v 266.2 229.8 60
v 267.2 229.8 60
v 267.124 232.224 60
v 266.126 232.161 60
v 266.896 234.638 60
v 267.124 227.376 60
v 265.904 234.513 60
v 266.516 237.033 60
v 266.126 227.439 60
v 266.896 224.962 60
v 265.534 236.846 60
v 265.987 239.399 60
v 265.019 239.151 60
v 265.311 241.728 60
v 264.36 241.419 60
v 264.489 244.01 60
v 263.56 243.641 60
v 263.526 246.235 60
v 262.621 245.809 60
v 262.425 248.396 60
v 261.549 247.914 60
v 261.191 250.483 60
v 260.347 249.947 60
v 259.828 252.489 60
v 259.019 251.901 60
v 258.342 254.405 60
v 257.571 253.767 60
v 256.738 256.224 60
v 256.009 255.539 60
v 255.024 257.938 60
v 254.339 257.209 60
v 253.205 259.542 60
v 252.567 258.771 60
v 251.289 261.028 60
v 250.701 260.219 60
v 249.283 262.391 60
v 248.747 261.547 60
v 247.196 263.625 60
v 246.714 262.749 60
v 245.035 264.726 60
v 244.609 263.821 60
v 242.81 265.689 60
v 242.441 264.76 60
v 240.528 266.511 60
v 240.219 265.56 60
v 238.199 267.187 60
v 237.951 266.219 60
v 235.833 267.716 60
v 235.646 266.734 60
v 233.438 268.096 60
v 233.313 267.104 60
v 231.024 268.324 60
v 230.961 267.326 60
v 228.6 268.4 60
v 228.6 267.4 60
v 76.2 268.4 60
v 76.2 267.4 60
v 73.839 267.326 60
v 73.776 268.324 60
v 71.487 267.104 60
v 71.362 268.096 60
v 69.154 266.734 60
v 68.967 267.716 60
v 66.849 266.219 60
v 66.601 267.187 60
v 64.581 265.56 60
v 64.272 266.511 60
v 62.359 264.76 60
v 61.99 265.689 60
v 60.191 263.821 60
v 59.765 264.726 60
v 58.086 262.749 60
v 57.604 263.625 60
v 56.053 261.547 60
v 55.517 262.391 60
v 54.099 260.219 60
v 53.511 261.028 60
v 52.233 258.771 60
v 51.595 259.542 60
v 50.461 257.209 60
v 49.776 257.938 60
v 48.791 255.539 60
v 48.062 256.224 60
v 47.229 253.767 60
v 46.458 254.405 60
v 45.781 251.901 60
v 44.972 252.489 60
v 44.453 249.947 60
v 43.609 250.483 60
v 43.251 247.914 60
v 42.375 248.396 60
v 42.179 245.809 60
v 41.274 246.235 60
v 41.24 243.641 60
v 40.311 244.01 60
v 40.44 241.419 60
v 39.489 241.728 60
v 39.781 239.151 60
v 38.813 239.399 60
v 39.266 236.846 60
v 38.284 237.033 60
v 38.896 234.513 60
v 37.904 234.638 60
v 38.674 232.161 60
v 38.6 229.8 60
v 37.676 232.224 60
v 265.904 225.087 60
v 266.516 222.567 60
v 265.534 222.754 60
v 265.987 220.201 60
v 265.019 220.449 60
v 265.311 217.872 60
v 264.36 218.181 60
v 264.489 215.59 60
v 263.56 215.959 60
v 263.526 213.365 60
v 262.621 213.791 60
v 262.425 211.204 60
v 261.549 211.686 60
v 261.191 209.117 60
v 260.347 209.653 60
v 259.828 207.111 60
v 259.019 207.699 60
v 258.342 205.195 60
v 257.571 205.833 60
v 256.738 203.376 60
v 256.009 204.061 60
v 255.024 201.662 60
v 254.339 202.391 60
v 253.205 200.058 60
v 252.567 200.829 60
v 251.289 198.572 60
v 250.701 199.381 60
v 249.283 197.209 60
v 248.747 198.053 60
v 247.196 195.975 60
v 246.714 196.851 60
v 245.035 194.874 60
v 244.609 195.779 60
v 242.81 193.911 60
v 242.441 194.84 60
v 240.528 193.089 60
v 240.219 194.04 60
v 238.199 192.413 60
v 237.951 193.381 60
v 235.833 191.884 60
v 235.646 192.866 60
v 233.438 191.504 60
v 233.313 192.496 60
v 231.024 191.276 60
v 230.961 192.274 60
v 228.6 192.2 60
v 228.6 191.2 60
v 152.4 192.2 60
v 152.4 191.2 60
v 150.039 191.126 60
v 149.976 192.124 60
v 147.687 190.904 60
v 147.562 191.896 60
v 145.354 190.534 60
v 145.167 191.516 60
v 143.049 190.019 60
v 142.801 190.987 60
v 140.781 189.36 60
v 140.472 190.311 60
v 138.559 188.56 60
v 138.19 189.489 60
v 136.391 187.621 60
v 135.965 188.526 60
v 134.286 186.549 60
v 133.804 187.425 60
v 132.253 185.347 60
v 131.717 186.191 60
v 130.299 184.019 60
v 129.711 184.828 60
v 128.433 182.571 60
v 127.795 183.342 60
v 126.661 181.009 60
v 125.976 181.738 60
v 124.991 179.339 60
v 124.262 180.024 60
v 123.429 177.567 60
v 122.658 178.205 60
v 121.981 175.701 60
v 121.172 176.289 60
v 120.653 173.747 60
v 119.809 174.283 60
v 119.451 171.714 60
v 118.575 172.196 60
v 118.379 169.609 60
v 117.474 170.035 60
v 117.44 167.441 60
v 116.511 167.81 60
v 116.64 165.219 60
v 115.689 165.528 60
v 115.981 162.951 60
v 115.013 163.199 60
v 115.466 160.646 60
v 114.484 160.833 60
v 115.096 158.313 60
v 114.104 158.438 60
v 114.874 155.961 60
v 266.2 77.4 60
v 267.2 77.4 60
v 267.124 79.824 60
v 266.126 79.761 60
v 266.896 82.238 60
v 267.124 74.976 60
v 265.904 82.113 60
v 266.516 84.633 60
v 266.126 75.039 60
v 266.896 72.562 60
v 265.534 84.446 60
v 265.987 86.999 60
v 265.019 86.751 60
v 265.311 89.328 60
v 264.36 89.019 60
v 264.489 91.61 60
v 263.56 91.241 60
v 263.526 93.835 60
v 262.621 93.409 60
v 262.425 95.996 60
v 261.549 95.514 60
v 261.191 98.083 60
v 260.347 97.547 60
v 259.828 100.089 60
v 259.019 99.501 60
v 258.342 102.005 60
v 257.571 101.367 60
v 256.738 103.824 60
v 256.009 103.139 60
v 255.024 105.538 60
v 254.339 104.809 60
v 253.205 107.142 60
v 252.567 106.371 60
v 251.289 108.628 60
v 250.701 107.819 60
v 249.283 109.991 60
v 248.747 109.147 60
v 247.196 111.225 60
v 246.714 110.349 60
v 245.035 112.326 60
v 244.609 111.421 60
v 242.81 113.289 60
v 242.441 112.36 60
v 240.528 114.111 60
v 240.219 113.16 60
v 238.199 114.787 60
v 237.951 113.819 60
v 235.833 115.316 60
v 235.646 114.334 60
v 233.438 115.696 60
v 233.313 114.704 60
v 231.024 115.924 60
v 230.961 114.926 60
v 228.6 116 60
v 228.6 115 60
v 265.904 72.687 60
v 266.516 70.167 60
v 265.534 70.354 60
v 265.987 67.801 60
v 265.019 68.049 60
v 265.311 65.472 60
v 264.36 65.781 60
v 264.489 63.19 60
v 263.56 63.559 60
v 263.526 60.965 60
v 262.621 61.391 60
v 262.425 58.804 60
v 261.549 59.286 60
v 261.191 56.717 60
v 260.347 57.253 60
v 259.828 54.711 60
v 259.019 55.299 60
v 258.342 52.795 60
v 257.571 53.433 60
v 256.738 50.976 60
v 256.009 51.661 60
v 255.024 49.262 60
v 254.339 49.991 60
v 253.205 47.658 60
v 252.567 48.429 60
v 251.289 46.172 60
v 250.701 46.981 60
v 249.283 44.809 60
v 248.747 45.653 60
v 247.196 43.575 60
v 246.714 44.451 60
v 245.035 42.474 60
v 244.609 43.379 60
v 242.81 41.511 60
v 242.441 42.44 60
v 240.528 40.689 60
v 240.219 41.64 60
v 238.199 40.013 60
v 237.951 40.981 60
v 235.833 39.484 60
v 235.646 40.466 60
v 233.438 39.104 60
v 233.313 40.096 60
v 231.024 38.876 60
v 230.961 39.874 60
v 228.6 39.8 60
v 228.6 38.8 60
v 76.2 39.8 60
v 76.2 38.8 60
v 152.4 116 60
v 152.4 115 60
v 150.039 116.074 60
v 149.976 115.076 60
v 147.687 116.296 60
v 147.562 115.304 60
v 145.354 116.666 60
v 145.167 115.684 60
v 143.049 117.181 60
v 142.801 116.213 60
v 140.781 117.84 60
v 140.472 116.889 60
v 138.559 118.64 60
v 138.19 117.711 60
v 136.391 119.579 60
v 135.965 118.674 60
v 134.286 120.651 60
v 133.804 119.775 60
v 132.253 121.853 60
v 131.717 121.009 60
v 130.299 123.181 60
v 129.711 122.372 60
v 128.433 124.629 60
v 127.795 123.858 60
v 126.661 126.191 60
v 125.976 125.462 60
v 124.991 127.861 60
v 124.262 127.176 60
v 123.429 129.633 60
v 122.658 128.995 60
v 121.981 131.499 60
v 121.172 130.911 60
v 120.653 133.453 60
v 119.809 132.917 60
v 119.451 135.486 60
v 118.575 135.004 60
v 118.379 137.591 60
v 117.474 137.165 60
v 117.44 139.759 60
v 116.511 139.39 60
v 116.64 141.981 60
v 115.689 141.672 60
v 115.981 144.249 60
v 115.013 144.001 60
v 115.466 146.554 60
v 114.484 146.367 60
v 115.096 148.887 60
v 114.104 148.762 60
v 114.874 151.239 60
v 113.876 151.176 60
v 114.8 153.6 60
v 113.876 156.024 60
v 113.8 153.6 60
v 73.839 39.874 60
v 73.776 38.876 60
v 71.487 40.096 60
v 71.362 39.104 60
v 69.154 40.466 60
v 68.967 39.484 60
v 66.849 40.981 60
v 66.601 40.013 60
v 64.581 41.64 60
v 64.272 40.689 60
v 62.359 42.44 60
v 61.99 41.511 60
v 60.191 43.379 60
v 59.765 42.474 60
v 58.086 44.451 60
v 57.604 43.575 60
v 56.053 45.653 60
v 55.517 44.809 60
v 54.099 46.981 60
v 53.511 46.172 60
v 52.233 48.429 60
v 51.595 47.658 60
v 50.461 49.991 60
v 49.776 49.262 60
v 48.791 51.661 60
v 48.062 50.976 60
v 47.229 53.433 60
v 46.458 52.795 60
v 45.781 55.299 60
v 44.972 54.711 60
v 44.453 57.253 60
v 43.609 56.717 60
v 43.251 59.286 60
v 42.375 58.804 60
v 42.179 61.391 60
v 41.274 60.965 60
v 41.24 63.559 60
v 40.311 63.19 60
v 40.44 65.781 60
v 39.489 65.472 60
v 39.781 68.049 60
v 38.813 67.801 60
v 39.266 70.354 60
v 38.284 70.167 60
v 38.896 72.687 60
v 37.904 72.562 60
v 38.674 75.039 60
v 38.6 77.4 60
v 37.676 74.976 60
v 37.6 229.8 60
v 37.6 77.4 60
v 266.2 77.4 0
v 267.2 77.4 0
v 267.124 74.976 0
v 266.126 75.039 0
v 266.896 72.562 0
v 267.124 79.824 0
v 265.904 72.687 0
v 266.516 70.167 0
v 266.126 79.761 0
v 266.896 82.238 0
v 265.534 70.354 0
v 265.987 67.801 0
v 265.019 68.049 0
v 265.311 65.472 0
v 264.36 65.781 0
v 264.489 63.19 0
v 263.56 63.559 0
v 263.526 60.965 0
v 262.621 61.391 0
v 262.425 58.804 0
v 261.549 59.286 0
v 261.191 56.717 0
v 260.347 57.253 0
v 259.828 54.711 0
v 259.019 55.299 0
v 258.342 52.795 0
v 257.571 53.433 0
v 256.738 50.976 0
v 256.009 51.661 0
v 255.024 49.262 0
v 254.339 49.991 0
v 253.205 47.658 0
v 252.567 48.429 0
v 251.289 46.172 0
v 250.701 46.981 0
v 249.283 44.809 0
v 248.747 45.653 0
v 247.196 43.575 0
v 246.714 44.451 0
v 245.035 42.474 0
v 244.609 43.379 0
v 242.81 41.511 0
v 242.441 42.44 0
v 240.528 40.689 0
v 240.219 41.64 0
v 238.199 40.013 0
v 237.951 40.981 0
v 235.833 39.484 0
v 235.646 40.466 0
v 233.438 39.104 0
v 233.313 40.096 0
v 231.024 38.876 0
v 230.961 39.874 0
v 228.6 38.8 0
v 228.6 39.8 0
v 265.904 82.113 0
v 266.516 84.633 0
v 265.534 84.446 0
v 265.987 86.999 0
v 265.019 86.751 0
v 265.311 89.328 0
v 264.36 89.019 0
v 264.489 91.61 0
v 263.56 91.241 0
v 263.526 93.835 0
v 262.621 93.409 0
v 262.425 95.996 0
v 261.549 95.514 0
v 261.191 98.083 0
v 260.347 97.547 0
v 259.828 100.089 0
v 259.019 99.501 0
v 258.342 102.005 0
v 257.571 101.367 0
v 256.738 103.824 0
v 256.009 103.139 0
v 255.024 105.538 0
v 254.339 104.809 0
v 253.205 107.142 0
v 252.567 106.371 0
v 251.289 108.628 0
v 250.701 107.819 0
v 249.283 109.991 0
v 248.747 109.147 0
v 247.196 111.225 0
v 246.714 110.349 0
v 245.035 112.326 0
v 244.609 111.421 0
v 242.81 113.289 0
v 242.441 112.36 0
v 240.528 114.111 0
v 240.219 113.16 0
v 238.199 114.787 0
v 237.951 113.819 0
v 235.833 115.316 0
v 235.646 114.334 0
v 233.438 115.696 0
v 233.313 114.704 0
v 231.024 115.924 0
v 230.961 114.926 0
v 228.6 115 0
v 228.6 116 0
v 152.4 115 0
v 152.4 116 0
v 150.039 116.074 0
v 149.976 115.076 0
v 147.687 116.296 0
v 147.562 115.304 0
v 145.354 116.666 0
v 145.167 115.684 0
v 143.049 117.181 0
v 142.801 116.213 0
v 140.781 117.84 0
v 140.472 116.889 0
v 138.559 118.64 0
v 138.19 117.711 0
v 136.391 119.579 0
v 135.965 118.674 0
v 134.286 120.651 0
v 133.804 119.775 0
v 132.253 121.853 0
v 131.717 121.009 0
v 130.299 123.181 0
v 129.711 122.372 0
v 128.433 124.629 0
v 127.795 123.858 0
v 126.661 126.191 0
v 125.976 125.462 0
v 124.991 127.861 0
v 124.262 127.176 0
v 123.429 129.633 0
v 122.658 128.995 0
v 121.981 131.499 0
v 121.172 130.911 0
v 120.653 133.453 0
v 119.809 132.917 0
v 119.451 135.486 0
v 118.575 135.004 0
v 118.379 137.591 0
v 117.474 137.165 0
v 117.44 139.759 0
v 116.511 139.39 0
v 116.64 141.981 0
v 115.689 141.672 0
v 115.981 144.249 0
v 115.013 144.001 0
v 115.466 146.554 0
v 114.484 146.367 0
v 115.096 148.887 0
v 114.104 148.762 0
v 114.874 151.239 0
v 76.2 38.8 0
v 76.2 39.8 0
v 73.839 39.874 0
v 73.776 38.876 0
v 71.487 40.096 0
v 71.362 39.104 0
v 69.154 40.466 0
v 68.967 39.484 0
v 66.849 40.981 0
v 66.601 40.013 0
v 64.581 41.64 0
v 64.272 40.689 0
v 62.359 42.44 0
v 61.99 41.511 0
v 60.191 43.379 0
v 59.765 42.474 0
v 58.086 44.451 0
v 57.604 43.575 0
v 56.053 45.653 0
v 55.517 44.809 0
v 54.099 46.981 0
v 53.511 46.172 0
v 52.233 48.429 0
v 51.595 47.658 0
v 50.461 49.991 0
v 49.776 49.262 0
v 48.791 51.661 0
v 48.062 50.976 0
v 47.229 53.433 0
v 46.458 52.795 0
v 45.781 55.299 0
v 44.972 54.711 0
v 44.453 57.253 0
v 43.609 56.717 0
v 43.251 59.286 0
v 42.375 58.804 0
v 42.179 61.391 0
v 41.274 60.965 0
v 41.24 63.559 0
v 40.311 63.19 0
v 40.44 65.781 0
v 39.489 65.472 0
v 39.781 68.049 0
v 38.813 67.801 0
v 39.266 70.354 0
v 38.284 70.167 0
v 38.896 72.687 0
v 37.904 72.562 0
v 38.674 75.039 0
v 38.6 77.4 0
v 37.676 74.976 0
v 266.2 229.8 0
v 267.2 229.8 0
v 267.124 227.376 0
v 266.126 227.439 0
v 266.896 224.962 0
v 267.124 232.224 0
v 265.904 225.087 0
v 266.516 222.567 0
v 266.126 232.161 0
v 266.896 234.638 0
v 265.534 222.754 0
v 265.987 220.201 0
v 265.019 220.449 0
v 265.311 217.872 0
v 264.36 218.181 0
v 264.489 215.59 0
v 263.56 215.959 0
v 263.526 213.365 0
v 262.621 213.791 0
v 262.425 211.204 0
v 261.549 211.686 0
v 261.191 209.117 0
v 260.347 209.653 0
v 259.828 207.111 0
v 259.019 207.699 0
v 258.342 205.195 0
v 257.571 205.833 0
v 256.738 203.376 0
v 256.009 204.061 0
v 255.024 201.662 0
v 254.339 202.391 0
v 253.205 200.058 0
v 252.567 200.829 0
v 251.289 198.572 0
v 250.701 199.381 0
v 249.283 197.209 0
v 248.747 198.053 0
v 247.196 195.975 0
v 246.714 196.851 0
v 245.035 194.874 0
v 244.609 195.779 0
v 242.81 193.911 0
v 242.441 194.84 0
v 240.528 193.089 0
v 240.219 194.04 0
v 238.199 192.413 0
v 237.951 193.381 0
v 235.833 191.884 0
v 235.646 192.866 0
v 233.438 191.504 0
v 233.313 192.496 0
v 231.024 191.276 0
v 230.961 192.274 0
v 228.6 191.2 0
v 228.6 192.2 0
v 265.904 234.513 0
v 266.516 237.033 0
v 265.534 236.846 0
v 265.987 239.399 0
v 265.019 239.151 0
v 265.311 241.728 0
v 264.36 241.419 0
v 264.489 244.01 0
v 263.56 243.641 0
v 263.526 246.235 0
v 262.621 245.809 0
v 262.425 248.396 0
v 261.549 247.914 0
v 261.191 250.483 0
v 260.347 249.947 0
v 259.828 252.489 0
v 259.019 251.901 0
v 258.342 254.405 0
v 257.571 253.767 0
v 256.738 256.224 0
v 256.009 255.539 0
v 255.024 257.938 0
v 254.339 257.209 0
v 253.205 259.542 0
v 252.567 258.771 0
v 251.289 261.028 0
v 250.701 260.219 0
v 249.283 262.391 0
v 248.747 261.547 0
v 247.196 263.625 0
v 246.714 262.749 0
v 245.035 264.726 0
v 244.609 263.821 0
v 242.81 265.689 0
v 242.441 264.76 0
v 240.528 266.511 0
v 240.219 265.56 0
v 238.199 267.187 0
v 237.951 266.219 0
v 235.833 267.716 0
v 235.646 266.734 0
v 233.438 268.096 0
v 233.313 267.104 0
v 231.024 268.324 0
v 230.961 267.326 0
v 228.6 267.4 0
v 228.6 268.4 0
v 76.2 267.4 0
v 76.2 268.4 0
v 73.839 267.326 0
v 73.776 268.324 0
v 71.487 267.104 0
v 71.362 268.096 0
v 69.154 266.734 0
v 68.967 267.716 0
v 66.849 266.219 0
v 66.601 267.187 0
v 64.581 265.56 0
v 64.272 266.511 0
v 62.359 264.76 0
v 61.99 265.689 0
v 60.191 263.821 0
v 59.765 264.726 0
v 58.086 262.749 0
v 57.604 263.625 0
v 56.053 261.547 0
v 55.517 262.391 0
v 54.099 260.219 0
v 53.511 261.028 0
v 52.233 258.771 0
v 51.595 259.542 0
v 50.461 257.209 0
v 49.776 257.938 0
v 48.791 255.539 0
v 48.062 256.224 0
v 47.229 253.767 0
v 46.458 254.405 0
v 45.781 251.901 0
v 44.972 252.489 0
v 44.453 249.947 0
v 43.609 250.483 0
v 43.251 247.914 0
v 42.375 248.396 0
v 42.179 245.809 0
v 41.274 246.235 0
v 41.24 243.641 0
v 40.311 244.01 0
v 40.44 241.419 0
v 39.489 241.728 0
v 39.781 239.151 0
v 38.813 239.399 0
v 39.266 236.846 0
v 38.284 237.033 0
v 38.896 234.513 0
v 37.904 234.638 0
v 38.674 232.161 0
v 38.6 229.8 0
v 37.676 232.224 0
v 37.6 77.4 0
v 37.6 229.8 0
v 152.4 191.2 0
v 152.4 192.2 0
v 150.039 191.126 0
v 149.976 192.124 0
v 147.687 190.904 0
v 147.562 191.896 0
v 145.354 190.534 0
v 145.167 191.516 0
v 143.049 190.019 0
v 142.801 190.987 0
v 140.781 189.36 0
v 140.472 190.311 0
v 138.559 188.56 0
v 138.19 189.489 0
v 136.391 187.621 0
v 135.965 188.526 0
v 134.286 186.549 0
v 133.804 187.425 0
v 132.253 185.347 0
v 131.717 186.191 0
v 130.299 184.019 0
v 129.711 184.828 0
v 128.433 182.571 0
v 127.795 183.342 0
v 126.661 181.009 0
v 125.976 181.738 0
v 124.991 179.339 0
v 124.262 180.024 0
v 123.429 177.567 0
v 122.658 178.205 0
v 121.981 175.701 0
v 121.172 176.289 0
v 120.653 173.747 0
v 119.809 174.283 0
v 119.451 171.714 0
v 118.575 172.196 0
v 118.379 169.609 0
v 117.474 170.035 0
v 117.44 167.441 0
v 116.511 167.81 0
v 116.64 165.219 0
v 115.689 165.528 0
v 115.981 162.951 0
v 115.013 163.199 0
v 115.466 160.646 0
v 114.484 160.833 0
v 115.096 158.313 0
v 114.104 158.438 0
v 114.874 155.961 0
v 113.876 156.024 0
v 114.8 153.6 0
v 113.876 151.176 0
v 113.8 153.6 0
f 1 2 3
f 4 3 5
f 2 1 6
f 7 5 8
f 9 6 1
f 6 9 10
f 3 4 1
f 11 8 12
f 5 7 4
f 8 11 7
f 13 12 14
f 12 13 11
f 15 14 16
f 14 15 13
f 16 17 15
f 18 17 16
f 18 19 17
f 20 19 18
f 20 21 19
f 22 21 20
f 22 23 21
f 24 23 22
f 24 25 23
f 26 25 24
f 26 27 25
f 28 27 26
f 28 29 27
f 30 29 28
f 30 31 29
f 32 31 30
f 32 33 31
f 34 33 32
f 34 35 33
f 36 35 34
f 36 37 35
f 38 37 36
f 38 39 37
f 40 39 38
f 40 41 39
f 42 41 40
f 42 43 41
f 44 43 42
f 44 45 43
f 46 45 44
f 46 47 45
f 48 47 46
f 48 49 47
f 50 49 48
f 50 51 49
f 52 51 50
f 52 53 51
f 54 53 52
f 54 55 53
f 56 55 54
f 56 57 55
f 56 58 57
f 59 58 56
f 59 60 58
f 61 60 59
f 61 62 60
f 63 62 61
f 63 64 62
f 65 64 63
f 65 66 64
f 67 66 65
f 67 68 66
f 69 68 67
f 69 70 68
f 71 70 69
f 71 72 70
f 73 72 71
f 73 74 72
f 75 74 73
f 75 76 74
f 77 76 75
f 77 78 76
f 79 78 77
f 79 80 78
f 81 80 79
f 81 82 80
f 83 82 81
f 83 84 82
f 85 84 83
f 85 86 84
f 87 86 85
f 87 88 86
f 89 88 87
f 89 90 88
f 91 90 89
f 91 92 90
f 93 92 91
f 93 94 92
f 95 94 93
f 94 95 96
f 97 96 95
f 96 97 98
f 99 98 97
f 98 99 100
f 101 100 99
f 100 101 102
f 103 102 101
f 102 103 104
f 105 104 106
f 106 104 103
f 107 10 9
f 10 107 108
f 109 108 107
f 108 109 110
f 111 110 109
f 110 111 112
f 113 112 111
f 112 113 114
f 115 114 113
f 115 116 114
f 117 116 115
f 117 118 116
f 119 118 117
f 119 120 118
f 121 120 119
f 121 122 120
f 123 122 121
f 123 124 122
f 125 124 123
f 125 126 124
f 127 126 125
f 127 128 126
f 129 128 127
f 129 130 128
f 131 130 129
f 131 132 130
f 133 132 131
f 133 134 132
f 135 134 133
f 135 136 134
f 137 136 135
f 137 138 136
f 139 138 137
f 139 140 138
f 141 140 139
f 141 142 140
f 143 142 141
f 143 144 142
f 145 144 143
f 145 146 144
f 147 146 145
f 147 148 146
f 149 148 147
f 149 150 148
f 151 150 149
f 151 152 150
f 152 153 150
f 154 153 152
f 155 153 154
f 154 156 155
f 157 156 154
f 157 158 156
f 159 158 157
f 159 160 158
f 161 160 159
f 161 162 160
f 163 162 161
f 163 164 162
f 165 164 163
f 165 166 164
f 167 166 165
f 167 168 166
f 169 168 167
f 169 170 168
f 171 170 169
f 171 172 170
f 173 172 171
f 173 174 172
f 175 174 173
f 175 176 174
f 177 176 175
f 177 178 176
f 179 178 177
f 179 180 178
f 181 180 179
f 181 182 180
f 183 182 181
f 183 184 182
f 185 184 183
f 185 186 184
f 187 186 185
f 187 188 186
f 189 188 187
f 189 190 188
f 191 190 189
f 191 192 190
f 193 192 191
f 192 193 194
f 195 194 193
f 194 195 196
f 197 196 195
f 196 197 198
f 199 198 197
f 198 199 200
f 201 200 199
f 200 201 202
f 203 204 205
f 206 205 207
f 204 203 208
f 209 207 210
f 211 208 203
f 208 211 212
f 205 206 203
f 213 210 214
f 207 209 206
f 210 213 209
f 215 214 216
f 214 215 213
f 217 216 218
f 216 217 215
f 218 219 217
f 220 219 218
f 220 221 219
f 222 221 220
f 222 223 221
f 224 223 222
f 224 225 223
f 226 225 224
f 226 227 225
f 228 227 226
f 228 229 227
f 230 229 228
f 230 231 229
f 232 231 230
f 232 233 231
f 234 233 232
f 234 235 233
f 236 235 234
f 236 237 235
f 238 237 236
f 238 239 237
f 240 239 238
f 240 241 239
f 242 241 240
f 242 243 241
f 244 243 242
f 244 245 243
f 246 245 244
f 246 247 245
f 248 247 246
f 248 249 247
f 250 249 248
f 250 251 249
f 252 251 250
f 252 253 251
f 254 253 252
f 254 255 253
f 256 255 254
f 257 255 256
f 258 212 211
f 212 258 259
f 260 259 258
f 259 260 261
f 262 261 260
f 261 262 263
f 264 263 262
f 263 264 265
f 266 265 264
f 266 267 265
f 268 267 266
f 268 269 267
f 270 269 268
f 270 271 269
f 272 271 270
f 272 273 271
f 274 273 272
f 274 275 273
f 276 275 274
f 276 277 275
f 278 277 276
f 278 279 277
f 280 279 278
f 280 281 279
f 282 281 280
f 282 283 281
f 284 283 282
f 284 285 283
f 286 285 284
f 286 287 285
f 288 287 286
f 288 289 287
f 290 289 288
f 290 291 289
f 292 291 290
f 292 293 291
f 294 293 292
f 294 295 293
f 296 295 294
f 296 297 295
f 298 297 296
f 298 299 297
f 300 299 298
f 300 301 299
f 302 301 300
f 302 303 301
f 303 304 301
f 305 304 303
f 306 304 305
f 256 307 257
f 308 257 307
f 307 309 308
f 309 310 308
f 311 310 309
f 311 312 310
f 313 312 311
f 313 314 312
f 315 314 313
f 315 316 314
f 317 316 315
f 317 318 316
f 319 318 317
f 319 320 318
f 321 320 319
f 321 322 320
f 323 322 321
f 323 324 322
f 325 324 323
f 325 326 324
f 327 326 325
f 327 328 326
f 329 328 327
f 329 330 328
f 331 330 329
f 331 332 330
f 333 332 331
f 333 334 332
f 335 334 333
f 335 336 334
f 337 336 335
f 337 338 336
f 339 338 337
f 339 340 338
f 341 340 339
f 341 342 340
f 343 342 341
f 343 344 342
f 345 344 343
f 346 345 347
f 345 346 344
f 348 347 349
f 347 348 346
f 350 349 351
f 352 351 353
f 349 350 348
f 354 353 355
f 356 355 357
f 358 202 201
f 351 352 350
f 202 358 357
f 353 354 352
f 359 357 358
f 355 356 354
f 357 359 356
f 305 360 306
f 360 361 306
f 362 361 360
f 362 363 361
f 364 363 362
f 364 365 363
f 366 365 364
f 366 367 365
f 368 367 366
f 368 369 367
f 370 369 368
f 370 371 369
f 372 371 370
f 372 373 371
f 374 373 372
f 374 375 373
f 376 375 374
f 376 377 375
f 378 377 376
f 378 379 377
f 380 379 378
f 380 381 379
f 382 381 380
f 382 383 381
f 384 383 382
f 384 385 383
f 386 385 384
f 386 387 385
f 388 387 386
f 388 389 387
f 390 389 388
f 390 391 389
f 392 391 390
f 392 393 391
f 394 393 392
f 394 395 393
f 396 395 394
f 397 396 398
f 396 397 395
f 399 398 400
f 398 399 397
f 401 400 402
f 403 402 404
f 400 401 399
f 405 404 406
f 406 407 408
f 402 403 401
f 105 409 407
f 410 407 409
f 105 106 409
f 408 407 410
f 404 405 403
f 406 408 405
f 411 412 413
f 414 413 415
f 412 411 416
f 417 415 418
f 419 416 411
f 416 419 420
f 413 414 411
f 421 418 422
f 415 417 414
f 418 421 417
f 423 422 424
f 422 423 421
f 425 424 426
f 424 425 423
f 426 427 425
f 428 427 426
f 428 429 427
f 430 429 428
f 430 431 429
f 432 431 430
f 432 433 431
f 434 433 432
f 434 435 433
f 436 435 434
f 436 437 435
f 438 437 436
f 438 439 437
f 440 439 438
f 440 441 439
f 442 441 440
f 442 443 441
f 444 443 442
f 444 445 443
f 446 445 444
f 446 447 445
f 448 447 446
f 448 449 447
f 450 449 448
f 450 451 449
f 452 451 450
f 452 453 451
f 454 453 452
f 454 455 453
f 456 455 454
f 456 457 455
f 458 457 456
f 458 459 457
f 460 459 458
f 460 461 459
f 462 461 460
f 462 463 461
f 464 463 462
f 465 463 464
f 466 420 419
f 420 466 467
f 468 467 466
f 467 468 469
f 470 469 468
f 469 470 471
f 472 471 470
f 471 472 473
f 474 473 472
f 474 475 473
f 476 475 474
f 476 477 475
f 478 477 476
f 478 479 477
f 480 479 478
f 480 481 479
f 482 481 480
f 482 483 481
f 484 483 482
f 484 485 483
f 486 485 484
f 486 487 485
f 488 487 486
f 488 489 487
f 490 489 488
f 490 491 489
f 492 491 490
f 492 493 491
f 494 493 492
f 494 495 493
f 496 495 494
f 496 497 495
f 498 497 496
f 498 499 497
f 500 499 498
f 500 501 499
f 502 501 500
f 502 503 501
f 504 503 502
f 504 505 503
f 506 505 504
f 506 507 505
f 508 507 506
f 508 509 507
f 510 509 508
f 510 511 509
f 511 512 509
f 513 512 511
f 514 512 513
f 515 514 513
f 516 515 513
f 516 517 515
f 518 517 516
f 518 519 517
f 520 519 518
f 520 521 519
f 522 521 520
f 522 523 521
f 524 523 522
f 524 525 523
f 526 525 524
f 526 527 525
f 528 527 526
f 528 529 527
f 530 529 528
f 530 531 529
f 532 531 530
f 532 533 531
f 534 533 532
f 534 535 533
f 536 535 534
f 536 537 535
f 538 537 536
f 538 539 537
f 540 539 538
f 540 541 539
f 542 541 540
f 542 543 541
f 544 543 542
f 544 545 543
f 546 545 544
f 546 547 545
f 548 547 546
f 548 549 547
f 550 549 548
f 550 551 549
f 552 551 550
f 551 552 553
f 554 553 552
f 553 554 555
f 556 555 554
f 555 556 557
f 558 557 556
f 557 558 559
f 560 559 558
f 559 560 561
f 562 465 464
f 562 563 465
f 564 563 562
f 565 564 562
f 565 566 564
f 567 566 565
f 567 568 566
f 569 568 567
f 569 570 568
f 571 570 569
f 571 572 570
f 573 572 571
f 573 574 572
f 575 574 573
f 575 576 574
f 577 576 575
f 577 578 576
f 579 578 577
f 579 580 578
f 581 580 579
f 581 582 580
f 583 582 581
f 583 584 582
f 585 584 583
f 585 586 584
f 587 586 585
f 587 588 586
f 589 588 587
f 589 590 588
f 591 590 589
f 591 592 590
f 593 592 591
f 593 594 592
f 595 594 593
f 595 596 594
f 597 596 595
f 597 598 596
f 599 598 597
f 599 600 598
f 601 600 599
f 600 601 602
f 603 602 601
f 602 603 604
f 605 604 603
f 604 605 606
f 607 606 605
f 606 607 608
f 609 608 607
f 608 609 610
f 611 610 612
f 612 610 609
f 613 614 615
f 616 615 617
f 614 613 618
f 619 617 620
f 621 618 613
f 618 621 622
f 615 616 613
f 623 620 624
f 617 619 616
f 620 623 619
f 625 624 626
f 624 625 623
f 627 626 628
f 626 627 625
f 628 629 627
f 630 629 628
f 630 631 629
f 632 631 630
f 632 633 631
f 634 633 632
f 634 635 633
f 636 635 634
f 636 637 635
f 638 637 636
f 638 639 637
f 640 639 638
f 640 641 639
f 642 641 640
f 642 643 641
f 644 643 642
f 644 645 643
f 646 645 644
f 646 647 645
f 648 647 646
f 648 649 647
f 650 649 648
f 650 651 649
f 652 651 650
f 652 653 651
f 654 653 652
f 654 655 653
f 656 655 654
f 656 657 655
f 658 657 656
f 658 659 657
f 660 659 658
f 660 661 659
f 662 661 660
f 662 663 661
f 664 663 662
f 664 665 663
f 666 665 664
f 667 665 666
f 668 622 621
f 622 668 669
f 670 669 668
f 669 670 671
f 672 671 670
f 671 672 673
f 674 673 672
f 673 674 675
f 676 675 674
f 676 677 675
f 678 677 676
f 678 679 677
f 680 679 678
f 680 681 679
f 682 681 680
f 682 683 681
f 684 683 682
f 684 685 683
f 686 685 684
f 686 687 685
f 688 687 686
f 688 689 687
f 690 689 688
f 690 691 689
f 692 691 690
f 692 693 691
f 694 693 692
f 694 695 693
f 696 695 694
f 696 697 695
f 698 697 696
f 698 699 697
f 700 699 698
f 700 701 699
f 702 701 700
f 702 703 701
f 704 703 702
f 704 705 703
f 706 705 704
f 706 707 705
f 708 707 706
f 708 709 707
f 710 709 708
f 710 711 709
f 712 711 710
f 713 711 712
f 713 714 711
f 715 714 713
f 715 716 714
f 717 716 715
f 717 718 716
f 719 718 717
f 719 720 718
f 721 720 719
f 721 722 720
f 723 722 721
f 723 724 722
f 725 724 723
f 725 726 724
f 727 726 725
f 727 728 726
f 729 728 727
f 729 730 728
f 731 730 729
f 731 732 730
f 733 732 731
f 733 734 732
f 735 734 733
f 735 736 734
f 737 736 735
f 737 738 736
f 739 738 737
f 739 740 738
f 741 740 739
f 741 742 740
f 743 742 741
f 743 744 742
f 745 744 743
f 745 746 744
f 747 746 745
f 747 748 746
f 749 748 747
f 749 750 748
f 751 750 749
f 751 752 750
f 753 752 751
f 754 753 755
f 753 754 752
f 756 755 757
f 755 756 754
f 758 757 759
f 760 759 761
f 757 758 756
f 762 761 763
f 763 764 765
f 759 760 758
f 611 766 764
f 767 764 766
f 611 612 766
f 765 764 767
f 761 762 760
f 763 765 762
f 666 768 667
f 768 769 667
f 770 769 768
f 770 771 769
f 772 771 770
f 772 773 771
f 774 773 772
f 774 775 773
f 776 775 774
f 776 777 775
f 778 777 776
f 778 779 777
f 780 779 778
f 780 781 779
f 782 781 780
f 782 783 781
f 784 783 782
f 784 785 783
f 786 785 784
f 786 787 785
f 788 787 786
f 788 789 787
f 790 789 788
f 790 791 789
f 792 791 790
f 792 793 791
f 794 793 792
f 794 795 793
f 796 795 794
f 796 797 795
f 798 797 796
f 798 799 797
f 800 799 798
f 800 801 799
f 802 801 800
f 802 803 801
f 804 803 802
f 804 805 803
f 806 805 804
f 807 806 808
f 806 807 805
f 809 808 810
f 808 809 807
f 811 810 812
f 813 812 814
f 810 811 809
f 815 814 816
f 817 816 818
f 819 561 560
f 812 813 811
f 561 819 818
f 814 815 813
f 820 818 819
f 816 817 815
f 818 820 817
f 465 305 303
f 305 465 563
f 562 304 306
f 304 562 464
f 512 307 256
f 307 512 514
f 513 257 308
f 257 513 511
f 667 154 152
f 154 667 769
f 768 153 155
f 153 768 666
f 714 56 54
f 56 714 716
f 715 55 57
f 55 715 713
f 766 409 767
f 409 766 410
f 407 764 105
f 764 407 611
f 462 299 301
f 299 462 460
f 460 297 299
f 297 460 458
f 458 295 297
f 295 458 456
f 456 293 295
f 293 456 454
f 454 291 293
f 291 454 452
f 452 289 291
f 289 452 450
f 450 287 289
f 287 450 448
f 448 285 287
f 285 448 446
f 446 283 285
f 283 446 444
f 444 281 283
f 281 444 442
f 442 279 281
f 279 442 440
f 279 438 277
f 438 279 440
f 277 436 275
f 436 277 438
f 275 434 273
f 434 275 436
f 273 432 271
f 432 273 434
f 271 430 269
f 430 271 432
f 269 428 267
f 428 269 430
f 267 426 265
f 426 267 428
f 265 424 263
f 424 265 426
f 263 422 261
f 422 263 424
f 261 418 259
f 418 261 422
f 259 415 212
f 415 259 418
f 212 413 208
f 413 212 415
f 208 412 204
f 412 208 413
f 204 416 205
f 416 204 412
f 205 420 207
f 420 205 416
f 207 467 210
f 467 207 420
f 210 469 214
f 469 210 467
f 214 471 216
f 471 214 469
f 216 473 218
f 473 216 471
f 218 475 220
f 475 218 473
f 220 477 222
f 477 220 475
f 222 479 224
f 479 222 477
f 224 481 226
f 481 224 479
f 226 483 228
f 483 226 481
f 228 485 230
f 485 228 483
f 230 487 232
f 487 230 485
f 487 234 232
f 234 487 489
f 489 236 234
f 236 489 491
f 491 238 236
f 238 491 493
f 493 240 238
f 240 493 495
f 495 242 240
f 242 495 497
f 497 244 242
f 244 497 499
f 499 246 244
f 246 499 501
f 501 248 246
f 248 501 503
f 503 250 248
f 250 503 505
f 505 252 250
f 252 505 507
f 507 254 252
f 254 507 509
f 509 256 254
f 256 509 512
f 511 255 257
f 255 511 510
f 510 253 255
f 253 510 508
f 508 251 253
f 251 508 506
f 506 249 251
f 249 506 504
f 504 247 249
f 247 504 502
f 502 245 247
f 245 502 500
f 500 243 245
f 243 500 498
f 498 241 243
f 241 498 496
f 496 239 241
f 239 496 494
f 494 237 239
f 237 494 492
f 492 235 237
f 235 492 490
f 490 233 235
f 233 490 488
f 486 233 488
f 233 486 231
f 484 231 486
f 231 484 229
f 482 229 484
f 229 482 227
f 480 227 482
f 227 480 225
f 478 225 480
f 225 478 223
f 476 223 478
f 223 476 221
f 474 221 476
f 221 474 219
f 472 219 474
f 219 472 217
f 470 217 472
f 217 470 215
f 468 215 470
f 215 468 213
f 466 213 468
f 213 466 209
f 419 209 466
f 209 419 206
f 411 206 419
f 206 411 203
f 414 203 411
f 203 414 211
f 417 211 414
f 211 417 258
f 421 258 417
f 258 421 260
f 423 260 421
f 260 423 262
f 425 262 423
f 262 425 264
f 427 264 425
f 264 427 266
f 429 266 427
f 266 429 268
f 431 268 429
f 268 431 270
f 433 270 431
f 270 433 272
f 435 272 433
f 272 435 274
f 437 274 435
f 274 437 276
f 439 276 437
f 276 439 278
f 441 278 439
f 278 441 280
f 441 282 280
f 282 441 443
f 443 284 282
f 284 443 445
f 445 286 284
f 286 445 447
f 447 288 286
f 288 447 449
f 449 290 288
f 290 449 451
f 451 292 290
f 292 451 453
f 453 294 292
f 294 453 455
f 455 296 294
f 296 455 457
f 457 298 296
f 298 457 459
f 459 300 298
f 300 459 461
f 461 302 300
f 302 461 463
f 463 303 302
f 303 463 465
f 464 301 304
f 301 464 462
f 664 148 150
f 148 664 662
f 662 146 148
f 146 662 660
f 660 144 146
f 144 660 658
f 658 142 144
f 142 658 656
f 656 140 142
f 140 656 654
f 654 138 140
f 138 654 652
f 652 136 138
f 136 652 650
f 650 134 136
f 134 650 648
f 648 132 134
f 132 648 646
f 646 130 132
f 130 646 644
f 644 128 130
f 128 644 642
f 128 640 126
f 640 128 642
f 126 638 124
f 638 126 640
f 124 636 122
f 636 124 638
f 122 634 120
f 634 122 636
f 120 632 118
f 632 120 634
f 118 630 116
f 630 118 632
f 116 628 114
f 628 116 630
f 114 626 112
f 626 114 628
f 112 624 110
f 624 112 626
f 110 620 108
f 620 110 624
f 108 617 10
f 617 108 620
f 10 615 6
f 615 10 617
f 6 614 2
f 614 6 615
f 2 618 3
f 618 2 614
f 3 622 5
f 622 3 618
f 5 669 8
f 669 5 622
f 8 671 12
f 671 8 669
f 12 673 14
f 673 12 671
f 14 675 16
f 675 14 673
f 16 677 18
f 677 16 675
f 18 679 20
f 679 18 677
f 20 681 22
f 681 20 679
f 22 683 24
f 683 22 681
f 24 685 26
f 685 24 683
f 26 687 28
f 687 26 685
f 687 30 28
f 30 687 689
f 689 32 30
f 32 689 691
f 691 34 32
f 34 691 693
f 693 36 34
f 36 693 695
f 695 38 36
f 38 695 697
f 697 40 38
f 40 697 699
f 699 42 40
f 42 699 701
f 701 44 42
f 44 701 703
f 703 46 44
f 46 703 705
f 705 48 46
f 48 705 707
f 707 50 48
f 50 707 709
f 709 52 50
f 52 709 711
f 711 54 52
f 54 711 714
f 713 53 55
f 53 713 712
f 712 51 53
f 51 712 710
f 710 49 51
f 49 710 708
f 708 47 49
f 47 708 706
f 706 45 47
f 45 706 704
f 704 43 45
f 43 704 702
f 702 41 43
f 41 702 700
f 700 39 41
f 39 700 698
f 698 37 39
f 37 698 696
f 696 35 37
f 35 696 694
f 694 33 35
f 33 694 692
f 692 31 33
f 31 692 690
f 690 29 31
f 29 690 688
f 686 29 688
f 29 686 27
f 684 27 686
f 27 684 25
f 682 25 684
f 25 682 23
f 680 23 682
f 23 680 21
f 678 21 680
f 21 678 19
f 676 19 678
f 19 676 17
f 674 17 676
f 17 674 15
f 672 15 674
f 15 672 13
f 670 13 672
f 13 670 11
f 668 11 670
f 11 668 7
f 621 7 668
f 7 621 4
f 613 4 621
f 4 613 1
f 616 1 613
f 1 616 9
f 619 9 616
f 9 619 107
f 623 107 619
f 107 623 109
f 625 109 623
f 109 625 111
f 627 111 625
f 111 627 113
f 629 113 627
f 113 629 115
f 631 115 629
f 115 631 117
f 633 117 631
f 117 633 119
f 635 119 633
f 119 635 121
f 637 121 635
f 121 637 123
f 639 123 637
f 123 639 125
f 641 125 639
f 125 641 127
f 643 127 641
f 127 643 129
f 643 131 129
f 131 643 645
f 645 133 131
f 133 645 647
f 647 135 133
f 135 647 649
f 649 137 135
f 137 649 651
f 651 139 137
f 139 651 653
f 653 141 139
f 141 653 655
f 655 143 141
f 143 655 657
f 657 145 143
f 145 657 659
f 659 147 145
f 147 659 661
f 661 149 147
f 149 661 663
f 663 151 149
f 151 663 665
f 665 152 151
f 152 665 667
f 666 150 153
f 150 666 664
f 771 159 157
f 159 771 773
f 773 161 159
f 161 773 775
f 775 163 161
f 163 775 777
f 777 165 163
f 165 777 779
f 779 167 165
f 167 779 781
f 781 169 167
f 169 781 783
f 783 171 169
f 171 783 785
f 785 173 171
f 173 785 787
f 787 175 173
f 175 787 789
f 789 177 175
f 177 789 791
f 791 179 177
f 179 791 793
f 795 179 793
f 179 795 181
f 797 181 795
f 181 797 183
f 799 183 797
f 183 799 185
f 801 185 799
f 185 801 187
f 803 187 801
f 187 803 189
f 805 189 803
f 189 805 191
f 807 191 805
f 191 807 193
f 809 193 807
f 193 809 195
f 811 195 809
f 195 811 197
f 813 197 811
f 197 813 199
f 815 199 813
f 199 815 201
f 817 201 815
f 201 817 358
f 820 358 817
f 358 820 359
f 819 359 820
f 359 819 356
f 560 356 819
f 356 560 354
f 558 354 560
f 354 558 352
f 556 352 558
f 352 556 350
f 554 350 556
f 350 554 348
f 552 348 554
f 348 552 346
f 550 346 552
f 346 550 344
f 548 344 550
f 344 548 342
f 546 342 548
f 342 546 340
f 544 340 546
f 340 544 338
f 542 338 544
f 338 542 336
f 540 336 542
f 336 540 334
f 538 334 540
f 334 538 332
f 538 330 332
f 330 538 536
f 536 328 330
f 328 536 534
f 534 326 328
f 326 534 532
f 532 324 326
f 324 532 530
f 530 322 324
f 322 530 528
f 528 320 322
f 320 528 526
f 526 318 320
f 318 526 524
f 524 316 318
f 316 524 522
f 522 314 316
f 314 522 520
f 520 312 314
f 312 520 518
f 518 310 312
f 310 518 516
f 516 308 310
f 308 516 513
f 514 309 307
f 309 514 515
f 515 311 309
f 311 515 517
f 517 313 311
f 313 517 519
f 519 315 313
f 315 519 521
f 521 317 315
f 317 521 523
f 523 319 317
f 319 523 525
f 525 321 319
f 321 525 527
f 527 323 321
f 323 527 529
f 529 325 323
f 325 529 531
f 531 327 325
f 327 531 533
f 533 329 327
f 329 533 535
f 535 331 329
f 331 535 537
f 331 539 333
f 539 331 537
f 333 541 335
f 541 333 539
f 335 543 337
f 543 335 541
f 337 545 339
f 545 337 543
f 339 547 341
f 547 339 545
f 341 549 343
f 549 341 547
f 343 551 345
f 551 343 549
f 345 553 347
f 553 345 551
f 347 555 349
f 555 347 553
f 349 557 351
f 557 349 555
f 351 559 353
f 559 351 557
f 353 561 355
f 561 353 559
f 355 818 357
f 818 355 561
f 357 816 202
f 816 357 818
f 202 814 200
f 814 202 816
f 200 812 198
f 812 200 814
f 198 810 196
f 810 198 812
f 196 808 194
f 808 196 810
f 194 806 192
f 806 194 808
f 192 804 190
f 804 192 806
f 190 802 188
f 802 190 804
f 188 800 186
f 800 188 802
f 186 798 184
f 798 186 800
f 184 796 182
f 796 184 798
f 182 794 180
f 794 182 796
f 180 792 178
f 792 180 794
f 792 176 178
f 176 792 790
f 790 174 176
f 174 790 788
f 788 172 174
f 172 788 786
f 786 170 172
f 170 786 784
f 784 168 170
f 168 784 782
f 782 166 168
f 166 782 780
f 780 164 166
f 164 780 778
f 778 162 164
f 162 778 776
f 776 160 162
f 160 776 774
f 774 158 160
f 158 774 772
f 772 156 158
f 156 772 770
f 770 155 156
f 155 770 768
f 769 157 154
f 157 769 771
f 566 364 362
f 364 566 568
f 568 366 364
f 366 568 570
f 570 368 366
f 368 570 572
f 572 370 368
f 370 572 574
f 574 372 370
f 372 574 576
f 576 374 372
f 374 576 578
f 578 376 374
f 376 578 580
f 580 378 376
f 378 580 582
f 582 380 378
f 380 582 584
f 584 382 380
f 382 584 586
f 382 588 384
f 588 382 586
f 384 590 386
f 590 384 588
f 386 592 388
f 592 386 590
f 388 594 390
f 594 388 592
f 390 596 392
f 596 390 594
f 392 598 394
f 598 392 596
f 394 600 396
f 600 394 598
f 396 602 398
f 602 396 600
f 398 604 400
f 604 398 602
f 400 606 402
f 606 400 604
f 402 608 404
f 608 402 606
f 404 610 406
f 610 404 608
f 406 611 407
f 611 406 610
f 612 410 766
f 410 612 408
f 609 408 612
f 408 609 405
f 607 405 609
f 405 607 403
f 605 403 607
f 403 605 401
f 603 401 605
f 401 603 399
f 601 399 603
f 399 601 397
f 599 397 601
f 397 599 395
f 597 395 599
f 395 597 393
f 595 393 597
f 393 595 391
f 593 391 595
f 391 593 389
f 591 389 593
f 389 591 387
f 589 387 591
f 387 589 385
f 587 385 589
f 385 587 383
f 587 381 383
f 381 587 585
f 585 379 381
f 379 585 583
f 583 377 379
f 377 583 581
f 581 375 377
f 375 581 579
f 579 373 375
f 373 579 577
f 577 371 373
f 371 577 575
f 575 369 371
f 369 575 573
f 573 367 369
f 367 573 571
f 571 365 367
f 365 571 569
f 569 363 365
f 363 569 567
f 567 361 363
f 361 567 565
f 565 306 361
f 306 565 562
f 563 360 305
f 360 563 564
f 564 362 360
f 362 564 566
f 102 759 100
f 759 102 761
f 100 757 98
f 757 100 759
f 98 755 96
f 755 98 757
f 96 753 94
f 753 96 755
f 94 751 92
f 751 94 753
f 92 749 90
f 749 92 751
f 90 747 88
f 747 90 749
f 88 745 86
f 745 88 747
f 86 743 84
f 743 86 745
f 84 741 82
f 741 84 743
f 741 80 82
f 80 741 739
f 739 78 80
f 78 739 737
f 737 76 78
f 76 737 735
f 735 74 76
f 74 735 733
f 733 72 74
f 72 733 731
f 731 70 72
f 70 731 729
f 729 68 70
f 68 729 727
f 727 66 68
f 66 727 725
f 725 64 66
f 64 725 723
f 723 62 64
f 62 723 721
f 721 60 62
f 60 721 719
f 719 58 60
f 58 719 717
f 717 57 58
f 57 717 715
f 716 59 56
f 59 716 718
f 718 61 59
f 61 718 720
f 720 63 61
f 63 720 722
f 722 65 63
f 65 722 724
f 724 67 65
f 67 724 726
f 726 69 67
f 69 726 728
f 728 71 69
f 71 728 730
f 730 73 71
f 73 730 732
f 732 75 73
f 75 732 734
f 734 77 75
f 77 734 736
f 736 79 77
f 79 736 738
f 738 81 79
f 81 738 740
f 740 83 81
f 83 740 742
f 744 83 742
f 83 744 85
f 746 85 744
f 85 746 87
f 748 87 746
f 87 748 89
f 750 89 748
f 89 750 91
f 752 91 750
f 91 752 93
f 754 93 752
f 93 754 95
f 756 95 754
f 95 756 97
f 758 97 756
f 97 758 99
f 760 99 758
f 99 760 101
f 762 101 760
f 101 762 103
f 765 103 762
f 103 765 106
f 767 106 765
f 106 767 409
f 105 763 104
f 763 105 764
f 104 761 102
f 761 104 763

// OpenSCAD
// file: arcBuilder.scad
fn = 24;

module sector(radius=10, anglesSector=[0, 180], fn = 100) {
    r = radius / cos(180 / fn);
    step = -360 / fn;

    points = concat([[0, 0]],
        [for(a = [anglesSector[0] : step : anglesSector[1] - 360]) 
            [r * cos(a), r * sin(a)]
        ],
        [[r * cos(anglesSector[1]), r * sin(anglesSector[1])]]
    );

    difference() {
        circle(radius, $fn = fn);
        polygon(points);
    }
}

module arc(radius, anglesArc=[0,45], width = 1, fn = 100) {
    difference() {
        sector(radius + width, anglesArc, fn);
        sector(radius, anglesArc, fn);
    }
} 

//linear_extrude(1) arc(radius, angles, width);
// file: 3dPrintBed.scad
footToMillimeters=304.8;

module hotPlate(length=1, width=1, height=10) {
    color("grey",1.0) {
        translate([0,0,-height]) {
            cube([length*footToMillimeters, width*footToMillimeters, height]);
        }
    }
}
module gridPlate(length=1, width=1, height = 9) {
    // For grid X 
    for(i = [0 : 2]) {
        translateX = i*(304.8/4);
        translate([0,footToMillimeters/4 + translateX, -height]) {
            gridX();
        }
    }
    
    // For grid Y
    for(i = [0 : 2]) {
        translateY = i*(304.8/4);
        translate([footToMillimeters/4 + translateY, 0, -height]) {
            gridY();
        }
    }
}

module gridY(length=1, width=1, height=10) {
    color("LimeGreen", 1.0) {
        cube([1, width*footToMillimeters, height]);
    }
}
module gridX(length=1, width=1, height=10) {
    color("Crimson", 1.0) {
        cube([length*footToMillimeters, 1, height]);
    }
}
// main file
// Jim Samson
// Belt for rat Project
// November 12, 2018

include<3dPrintBed.scad>
include<arcBuilder.scad>

$fs=0.1;
footToMillimeters=304.8;

beltHeight=60; // millimeters
beltWidth=1;

// For line Length
lineLength=footToMillimeters/4;
linePlacement = footToMillimeters/8;

// For Circles
radius = 37.6;
angles = [-90, 90];
width = beltWidth;
offsetLength=0.7;
offsetForLines = offsetLength + 1;

belt();

module belt() {
    //hotPlate(); // From 3dPrintBed hotPlate module
    //gridPlate(); // From 3dPrintBed gridPlate module
    union() {
        rowThreeLines();
        rowTwoLines();
        rowOneLines();
        rowFourHalfCircles();
        rowTwoHalfCircle();
        rowOneQuarterCircleA();
        rowOneQuarterCircleB();
    }
}

module rowFourHalfCircles() {
    for(i = [0:1]) {
        translate([lineLength*3, (i*lineLength) * 2 + offsetLength + 0.5 + lineLength,0]) {
            linear_extrude(beltHeight) arc(radius, angles, width);
        }
    }
}

module rowThreeLines() {
    for(i = [0 : 3]) {
        translate([2 * lineLength, (i * lineLength) + linePlacement + offsetLength, 0]) {
            lineX();
        }
    }
}

module rowTwoHalfCircle() {
    translate([lineLength*2, (lineLength) * 2 + offsetLength + 0.5,0]) {
        rotate([0,0,180]) {
            linear_extrude(beltHeight) arc(radius, angles, width);
        }
    }
}

module rowTwoLines() {
    for(i = [0 : 1]) {
        translate([lineLength, 3 * (i * lineLength) + linePlacement + offsetLength, 0]) {
            lineX();
        }
    }
}

module rowOneQuarterCircleA() {
    translate([lineLength,lineLength + offsetLength + 0.5,0]) {
        rotate([0,0,180]) {
            linear_extrude(beltHeight) arc(radius, [0,90], width);
        }
    }
}

module rowOneQuarterCircleB() {
    translate([lineLength,lineLength*3 + offsetLength + 0.5,0]) {
        rotate([0,0,90]) {
            linear_extrude(beltHeight) arc(radius, [0,90], width);
        }
    }
}

module rowOneLines() {
    for(i = [0 : 1]) {
        translate([linePlacement + offsetLength -0.2, (i*lineLength) + lineLength + offsetLength + 0.5,0]) {
            lineY();
        }
    }
}

module lineX() {
    #cube([lineLength, beltWidth, beltHeight]);
}

module lineY() {
    rotate([0,0,90]) {
        lineX();
    }
}
